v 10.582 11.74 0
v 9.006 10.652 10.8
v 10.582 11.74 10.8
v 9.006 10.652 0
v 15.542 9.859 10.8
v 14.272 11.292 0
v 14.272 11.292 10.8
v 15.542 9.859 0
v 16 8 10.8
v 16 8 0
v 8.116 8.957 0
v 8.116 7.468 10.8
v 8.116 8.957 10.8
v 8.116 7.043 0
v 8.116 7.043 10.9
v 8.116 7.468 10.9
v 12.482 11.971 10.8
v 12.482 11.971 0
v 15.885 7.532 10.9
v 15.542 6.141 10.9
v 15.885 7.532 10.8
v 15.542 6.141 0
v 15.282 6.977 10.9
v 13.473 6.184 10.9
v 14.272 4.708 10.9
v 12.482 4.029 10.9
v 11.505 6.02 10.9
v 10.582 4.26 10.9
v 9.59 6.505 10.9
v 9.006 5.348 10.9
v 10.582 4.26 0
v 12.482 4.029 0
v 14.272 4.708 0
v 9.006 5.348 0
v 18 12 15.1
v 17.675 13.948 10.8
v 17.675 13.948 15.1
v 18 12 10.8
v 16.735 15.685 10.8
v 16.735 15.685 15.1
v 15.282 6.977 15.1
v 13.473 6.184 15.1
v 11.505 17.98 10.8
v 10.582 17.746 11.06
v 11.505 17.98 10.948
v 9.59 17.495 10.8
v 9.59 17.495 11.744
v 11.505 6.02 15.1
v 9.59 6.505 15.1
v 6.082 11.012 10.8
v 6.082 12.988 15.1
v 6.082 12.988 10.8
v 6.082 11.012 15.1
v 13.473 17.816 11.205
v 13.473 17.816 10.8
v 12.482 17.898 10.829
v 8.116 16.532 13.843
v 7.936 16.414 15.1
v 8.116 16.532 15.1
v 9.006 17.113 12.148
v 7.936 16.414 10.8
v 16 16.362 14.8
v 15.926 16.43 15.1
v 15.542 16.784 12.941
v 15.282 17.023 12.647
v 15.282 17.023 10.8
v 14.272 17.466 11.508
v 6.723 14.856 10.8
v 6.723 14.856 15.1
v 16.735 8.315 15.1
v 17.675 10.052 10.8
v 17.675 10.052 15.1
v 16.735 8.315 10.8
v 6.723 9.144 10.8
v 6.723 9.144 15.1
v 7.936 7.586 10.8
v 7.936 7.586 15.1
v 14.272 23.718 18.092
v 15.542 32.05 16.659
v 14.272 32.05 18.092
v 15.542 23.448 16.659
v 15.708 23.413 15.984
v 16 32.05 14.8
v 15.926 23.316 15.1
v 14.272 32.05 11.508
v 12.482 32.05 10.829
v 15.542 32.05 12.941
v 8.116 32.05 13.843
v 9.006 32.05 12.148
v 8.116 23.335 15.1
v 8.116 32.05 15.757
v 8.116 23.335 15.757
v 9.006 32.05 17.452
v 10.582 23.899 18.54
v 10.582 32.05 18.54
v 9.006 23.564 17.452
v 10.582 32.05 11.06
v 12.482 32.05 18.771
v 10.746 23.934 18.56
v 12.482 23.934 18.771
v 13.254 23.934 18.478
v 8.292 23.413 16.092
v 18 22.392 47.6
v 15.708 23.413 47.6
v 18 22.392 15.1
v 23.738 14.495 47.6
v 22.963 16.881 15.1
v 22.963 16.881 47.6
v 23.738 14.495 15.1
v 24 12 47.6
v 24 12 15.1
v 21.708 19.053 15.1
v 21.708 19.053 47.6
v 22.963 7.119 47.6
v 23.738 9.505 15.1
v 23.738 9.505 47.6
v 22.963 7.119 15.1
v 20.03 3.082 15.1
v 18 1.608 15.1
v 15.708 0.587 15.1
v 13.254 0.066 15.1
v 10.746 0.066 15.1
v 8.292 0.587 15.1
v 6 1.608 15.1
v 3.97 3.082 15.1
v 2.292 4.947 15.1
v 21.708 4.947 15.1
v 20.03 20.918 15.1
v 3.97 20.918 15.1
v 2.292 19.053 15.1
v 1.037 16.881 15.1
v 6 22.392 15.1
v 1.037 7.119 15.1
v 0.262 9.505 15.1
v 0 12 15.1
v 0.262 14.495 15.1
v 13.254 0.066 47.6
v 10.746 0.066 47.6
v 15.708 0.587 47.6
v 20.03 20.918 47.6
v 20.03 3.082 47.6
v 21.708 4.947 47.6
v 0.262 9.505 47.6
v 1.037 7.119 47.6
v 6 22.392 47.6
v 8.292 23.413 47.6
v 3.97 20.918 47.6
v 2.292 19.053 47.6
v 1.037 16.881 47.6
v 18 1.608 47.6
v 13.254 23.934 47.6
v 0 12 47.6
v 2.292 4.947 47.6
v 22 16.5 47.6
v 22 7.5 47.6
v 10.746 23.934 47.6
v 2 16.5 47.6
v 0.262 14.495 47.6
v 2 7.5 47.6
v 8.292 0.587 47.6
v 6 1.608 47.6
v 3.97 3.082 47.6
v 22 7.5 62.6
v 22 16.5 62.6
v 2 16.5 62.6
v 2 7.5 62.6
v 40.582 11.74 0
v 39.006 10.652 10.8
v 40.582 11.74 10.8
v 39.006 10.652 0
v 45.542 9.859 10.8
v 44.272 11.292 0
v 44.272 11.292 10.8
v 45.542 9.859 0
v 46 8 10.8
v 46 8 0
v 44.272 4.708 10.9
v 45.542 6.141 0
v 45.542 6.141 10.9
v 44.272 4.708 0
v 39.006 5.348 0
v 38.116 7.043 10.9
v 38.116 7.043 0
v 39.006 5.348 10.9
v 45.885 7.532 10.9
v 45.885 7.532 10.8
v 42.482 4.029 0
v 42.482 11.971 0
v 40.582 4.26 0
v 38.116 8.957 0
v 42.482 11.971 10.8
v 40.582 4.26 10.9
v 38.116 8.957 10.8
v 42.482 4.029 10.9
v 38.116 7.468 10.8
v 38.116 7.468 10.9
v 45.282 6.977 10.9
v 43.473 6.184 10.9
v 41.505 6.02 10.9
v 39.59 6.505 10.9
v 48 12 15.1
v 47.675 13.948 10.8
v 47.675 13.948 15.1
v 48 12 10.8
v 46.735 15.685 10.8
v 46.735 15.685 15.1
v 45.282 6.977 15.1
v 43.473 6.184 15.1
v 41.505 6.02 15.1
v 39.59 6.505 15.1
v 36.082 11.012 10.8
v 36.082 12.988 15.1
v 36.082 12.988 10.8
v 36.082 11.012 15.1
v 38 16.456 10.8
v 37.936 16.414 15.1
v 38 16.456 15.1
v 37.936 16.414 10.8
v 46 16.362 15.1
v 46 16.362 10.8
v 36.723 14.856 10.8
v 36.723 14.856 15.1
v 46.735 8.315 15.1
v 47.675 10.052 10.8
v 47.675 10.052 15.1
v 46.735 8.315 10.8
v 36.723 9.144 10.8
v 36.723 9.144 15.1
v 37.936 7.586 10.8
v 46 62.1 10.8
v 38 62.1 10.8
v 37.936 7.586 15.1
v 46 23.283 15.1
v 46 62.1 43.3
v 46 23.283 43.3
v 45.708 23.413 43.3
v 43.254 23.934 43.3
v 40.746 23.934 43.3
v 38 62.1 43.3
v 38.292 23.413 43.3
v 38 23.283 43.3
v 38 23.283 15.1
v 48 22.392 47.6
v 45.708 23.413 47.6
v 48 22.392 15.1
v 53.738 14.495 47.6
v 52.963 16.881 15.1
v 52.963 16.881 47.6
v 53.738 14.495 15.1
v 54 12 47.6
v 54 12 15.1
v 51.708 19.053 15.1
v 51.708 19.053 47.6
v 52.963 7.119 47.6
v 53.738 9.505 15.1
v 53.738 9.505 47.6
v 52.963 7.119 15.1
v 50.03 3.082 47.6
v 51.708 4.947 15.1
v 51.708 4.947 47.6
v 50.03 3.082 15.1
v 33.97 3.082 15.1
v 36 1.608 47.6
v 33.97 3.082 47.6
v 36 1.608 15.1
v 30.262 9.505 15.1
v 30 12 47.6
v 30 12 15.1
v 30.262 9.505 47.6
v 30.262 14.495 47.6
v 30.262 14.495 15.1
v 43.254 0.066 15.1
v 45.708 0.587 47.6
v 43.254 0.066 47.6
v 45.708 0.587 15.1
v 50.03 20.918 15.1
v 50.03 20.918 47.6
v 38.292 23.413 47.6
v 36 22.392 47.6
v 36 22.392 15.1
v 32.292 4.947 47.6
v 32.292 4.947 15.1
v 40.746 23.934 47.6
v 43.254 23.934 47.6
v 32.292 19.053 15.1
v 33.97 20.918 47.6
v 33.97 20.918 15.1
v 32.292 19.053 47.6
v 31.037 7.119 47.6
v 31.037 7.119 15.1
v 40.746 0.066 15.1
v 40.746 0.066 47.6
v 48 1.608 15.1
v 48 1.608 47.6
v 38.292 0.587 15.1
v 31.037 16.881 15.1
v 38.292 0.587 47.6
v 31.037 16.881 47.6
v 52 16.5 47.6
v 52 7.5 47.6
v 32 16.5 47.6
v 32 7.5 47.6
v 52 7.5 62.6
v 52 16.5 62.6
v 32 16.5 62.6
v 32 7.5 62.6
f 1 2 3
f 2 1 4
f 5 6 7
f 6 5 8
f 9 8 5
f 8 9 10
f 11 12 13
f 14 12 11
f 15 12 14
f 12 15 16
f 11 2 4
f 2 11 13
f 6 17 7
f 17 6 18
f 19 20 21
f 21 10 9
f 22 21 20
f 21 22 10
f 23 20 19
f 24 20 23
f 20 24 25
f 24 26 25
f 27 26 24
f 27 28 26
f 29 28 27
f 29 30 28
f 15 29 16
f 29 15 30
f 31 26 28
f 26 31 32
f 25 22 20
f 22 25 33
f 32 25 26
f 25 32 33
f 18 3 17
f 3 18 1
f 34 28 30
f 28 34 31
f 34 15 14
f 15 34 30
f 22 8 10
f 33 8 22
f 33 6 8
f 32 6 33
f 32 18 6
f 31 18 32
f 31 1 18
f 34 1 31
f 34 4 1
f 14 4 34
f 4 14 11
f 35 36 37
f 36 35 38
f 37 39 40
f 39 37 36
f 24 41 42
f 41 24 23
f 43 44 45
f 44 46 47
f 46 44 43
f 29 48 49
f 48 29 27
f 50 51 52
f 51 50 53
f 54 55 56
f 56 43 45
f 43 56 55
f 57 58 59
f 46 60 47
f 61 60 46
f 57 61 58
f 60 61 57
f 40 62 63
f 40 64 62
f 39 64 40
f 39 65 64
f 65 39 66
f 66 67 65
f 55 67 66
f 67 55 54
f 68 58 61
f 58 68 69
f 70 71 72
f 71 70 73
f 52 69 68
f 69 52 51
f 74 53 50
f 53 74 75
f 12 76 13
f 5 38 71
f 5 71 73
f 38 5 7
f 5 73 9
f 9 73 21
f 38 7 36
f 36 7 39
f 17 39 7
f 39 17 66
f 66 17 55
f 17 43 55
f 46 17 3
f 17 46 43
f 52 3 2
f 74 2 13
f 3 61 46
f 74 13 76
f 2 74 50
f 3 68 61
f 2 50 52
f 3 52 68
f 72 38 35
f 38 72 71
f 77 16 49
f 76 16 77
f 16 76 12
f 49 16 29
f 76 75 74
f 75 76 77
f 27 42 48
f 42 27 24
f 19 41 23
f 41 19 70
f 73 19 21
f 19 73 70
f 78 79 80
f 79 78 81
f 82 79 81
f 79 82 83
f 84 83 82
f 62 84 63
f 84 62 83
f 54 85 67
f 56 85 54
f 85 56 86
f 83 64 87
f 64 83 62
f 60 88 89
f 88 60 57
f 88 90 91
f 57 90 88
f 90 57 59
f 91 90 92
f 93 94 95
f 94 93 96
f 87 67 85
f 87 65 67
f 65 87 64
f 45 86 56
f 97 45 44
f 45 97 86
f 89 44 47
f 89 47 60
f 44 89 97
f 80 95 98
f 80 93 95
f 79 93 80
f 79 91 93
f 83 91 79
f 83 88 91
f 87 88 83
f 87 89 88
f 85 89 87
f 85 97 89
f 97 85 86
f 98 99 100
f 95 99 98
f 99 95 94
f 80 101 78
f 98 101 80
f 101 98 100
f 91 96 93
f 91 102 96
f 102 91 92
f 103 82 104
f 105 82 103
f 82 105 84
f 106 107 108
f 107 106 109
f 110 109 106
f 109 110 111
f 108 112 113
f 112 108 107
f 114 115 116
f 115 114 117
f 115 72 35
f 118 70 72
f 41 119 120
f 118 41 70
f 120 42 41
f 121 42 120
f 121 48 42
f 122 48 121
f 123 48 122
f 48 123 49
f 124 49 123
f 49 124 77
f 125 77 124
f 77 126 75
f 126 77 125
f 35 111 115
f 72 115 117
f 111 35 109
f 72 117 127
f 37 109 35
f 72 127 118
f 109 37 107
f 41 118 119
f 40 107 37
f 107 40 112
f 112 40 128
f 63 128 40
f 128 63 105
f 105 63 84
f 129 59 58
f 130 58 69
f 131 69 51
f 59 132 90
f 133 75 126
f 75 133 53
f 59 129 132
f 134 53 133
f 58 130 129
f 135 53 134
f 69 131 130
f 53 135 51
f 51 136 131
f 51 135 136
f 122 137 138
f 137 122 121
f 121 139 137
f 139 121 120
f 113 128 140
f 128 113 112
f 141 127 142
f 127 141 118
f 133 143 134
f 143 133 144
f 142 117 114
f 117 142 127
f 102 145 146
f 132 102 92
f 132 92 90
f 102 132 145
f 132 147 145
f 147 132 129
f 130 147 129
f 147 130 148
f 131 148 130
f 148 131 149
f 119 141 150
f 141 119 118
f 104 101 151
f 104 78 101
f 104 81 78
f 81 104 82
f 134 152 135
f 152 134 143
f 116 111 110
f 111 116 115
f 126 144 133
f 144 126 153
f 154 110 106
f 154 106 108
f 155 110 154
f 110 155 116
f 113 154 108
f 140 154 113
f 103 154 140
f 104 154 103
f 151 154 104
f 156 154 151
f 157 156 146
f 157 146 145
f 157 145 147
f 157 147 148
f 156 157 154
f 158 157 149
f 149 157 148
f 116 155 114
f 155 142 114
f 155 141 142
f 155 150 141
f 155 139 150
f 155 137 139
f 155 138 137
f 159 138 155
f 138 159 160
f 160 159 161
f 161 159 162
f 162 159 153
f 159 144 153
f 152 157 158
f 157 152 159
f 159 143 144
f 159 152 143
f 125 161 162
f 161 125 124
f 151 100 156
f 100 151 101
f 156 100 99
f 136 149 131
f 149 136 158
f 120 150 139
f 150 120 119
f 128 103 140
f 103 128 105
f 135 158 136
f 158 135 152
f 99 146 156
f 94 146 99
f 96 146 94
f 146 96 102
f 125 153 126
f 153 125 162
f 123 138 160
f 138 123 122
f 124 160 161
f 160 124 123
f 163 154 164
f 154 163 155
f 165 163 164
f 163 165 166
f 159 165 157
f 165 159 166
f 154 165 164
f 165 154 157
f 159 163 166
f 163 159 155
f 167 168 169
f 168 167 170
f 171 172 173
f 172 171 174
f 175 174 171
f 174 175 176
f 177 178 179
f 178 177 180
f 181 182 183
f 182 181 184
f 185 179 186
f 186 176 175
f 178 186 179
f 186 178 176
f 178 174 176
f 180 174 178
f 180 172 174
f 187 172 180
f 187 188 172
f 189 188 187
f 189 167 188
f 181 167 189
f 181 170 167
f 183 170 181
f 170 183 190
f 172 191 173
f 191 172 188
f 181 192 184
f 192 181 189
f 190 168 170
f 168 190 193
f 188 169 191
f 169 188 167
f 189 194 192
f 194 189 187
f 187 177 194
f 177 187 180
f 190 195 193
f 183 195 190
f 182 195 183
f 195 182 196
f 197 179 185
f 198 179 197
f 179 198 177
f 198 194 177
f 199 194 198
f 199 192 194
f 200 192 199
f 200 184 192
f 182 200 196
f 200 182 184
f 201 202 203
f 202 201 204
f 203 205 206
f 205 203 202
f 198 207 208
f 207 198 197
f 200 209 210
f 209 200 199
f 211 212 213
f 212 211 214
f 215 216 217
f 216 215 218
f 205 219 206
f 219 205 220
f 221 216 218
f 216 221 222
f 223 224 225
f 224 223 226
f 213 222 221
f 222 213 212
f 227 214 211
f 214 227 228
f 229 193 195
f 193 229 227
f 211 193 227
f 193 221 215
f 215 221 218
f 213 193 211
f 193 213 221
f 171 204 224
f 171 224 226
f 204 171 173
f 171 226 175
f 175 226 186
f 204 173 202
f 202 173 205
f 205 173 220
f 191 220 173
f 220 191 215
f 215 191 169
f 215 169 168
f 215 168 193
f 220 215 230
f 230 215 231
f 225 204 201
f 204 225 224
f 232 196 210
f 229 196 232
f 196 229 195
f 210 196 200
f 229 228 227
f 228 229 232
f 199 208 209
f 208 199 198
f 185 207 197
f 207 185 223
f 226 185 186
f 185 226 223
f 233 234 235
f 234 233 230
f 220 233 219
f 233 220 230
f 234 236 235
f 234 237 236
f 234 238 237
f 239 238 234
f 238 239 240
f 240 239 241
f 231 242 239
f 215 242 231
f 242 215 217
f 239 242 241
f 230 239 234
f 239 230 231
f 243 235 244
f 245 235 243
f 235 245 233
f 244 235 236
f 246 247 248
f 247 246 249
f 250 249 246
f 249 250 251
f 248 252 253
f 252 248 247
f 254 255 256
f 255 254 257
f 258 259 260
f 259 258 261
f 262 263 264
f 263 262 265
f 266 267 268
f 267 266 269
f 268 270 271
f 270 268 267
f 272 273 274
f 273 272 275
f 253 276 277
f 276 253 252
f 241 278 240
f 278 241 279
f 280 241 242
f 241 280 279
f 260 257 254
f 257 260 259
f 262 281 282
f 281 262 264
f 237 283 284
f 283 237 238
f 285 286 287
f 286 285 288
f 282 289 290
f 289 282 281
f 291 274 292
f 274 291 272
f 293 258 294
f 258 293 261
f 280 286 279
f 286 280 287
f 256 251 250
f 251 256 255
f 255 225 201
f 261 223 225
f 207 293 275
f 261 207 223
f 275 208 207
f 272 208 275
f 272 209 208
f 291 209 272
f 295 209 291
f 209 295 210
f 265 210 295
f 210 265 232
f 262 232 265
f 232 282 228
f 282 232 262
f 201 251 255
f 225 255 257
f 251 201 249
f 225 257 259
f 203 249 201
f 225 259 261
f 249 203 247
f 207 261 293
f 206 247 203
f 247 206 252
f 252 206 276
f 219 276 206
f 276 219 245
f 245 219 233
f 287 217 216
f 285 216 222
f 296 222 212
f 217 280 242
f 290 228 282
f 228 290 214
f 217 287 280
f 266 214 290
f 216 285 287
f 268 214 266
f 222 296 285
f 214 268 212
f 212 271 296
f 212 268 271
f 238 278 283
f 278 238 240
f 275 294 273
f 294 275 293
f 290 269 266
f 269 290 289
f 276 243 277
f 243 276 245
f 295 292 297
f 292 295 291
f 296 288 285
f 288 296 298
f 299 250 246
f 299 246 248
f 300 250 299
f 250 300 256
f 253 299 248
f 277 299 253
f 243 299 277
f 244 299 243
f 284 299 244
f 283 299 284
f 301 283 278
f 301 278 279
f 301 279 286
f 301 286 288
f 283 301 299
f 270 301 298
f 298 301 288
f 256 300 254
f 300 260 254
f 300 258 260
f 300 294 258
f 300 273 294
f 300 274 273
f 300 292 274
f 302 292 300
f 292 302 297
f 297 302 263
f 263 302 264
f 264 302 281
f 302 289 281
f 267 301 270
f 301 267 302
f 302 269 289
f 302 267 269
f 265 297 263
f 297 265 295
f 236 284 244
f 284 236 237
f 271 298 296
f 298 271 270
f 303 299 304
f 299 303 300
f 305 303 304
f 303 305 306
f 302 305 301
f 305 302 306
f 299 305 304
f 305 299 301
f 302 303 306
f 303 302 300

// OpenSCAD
module solenoid(insertionClearance=true) {

	//Solenoid dimensions
	tubeDiameter = 8;//5.6 measured
	bodyDiameter = 24; //23.5 measured
	lowerRingDiameter = 12;//10.85 measured
//    if(center) {
//        offset = [-bodyDiameter/2, -bodyDiameter/2, -47.5/2];
//    }

    translate([bodyDiameter/2, bodyDiameter/2,0])
    {
          translate([0, -(tubeDiameter/2), 0.0]) cylinder(d=tubeDiameter, h=10.9); //Drain tube
          translate([0, 0, 10.8]) color([.2,.4,0]) cylinder(d=lowerRingDiameter,h=4.4); //Lower Ring
			if(insertionClearance) {
				translate([-(tubeDiameter/2), 0, 10.8]) cube([tubeDiameter, 50.1, 32.5]); //Supply Tube

			} else {
				translate([0, (20/2), 10.8+(tubeDiameter/2)]) rotate([90,0,0]) cylinder(d=tubeDiameter, h=20.1, center=true); //Supply Tube
			}
         translate([0, 0, 10.8+4.3]) cylinder(d=bodyDiameter, h=32.5); //Main body
			translate([0, 0, 10.8+4.3+32.5]) color([0,0,1]) cube([20, 9, 30], center=true); //Clearance for wiring harness
    }
}

solenoid(false);

translate([30,0,0]) color([1.0, 0, 0]) solenoid(true);
